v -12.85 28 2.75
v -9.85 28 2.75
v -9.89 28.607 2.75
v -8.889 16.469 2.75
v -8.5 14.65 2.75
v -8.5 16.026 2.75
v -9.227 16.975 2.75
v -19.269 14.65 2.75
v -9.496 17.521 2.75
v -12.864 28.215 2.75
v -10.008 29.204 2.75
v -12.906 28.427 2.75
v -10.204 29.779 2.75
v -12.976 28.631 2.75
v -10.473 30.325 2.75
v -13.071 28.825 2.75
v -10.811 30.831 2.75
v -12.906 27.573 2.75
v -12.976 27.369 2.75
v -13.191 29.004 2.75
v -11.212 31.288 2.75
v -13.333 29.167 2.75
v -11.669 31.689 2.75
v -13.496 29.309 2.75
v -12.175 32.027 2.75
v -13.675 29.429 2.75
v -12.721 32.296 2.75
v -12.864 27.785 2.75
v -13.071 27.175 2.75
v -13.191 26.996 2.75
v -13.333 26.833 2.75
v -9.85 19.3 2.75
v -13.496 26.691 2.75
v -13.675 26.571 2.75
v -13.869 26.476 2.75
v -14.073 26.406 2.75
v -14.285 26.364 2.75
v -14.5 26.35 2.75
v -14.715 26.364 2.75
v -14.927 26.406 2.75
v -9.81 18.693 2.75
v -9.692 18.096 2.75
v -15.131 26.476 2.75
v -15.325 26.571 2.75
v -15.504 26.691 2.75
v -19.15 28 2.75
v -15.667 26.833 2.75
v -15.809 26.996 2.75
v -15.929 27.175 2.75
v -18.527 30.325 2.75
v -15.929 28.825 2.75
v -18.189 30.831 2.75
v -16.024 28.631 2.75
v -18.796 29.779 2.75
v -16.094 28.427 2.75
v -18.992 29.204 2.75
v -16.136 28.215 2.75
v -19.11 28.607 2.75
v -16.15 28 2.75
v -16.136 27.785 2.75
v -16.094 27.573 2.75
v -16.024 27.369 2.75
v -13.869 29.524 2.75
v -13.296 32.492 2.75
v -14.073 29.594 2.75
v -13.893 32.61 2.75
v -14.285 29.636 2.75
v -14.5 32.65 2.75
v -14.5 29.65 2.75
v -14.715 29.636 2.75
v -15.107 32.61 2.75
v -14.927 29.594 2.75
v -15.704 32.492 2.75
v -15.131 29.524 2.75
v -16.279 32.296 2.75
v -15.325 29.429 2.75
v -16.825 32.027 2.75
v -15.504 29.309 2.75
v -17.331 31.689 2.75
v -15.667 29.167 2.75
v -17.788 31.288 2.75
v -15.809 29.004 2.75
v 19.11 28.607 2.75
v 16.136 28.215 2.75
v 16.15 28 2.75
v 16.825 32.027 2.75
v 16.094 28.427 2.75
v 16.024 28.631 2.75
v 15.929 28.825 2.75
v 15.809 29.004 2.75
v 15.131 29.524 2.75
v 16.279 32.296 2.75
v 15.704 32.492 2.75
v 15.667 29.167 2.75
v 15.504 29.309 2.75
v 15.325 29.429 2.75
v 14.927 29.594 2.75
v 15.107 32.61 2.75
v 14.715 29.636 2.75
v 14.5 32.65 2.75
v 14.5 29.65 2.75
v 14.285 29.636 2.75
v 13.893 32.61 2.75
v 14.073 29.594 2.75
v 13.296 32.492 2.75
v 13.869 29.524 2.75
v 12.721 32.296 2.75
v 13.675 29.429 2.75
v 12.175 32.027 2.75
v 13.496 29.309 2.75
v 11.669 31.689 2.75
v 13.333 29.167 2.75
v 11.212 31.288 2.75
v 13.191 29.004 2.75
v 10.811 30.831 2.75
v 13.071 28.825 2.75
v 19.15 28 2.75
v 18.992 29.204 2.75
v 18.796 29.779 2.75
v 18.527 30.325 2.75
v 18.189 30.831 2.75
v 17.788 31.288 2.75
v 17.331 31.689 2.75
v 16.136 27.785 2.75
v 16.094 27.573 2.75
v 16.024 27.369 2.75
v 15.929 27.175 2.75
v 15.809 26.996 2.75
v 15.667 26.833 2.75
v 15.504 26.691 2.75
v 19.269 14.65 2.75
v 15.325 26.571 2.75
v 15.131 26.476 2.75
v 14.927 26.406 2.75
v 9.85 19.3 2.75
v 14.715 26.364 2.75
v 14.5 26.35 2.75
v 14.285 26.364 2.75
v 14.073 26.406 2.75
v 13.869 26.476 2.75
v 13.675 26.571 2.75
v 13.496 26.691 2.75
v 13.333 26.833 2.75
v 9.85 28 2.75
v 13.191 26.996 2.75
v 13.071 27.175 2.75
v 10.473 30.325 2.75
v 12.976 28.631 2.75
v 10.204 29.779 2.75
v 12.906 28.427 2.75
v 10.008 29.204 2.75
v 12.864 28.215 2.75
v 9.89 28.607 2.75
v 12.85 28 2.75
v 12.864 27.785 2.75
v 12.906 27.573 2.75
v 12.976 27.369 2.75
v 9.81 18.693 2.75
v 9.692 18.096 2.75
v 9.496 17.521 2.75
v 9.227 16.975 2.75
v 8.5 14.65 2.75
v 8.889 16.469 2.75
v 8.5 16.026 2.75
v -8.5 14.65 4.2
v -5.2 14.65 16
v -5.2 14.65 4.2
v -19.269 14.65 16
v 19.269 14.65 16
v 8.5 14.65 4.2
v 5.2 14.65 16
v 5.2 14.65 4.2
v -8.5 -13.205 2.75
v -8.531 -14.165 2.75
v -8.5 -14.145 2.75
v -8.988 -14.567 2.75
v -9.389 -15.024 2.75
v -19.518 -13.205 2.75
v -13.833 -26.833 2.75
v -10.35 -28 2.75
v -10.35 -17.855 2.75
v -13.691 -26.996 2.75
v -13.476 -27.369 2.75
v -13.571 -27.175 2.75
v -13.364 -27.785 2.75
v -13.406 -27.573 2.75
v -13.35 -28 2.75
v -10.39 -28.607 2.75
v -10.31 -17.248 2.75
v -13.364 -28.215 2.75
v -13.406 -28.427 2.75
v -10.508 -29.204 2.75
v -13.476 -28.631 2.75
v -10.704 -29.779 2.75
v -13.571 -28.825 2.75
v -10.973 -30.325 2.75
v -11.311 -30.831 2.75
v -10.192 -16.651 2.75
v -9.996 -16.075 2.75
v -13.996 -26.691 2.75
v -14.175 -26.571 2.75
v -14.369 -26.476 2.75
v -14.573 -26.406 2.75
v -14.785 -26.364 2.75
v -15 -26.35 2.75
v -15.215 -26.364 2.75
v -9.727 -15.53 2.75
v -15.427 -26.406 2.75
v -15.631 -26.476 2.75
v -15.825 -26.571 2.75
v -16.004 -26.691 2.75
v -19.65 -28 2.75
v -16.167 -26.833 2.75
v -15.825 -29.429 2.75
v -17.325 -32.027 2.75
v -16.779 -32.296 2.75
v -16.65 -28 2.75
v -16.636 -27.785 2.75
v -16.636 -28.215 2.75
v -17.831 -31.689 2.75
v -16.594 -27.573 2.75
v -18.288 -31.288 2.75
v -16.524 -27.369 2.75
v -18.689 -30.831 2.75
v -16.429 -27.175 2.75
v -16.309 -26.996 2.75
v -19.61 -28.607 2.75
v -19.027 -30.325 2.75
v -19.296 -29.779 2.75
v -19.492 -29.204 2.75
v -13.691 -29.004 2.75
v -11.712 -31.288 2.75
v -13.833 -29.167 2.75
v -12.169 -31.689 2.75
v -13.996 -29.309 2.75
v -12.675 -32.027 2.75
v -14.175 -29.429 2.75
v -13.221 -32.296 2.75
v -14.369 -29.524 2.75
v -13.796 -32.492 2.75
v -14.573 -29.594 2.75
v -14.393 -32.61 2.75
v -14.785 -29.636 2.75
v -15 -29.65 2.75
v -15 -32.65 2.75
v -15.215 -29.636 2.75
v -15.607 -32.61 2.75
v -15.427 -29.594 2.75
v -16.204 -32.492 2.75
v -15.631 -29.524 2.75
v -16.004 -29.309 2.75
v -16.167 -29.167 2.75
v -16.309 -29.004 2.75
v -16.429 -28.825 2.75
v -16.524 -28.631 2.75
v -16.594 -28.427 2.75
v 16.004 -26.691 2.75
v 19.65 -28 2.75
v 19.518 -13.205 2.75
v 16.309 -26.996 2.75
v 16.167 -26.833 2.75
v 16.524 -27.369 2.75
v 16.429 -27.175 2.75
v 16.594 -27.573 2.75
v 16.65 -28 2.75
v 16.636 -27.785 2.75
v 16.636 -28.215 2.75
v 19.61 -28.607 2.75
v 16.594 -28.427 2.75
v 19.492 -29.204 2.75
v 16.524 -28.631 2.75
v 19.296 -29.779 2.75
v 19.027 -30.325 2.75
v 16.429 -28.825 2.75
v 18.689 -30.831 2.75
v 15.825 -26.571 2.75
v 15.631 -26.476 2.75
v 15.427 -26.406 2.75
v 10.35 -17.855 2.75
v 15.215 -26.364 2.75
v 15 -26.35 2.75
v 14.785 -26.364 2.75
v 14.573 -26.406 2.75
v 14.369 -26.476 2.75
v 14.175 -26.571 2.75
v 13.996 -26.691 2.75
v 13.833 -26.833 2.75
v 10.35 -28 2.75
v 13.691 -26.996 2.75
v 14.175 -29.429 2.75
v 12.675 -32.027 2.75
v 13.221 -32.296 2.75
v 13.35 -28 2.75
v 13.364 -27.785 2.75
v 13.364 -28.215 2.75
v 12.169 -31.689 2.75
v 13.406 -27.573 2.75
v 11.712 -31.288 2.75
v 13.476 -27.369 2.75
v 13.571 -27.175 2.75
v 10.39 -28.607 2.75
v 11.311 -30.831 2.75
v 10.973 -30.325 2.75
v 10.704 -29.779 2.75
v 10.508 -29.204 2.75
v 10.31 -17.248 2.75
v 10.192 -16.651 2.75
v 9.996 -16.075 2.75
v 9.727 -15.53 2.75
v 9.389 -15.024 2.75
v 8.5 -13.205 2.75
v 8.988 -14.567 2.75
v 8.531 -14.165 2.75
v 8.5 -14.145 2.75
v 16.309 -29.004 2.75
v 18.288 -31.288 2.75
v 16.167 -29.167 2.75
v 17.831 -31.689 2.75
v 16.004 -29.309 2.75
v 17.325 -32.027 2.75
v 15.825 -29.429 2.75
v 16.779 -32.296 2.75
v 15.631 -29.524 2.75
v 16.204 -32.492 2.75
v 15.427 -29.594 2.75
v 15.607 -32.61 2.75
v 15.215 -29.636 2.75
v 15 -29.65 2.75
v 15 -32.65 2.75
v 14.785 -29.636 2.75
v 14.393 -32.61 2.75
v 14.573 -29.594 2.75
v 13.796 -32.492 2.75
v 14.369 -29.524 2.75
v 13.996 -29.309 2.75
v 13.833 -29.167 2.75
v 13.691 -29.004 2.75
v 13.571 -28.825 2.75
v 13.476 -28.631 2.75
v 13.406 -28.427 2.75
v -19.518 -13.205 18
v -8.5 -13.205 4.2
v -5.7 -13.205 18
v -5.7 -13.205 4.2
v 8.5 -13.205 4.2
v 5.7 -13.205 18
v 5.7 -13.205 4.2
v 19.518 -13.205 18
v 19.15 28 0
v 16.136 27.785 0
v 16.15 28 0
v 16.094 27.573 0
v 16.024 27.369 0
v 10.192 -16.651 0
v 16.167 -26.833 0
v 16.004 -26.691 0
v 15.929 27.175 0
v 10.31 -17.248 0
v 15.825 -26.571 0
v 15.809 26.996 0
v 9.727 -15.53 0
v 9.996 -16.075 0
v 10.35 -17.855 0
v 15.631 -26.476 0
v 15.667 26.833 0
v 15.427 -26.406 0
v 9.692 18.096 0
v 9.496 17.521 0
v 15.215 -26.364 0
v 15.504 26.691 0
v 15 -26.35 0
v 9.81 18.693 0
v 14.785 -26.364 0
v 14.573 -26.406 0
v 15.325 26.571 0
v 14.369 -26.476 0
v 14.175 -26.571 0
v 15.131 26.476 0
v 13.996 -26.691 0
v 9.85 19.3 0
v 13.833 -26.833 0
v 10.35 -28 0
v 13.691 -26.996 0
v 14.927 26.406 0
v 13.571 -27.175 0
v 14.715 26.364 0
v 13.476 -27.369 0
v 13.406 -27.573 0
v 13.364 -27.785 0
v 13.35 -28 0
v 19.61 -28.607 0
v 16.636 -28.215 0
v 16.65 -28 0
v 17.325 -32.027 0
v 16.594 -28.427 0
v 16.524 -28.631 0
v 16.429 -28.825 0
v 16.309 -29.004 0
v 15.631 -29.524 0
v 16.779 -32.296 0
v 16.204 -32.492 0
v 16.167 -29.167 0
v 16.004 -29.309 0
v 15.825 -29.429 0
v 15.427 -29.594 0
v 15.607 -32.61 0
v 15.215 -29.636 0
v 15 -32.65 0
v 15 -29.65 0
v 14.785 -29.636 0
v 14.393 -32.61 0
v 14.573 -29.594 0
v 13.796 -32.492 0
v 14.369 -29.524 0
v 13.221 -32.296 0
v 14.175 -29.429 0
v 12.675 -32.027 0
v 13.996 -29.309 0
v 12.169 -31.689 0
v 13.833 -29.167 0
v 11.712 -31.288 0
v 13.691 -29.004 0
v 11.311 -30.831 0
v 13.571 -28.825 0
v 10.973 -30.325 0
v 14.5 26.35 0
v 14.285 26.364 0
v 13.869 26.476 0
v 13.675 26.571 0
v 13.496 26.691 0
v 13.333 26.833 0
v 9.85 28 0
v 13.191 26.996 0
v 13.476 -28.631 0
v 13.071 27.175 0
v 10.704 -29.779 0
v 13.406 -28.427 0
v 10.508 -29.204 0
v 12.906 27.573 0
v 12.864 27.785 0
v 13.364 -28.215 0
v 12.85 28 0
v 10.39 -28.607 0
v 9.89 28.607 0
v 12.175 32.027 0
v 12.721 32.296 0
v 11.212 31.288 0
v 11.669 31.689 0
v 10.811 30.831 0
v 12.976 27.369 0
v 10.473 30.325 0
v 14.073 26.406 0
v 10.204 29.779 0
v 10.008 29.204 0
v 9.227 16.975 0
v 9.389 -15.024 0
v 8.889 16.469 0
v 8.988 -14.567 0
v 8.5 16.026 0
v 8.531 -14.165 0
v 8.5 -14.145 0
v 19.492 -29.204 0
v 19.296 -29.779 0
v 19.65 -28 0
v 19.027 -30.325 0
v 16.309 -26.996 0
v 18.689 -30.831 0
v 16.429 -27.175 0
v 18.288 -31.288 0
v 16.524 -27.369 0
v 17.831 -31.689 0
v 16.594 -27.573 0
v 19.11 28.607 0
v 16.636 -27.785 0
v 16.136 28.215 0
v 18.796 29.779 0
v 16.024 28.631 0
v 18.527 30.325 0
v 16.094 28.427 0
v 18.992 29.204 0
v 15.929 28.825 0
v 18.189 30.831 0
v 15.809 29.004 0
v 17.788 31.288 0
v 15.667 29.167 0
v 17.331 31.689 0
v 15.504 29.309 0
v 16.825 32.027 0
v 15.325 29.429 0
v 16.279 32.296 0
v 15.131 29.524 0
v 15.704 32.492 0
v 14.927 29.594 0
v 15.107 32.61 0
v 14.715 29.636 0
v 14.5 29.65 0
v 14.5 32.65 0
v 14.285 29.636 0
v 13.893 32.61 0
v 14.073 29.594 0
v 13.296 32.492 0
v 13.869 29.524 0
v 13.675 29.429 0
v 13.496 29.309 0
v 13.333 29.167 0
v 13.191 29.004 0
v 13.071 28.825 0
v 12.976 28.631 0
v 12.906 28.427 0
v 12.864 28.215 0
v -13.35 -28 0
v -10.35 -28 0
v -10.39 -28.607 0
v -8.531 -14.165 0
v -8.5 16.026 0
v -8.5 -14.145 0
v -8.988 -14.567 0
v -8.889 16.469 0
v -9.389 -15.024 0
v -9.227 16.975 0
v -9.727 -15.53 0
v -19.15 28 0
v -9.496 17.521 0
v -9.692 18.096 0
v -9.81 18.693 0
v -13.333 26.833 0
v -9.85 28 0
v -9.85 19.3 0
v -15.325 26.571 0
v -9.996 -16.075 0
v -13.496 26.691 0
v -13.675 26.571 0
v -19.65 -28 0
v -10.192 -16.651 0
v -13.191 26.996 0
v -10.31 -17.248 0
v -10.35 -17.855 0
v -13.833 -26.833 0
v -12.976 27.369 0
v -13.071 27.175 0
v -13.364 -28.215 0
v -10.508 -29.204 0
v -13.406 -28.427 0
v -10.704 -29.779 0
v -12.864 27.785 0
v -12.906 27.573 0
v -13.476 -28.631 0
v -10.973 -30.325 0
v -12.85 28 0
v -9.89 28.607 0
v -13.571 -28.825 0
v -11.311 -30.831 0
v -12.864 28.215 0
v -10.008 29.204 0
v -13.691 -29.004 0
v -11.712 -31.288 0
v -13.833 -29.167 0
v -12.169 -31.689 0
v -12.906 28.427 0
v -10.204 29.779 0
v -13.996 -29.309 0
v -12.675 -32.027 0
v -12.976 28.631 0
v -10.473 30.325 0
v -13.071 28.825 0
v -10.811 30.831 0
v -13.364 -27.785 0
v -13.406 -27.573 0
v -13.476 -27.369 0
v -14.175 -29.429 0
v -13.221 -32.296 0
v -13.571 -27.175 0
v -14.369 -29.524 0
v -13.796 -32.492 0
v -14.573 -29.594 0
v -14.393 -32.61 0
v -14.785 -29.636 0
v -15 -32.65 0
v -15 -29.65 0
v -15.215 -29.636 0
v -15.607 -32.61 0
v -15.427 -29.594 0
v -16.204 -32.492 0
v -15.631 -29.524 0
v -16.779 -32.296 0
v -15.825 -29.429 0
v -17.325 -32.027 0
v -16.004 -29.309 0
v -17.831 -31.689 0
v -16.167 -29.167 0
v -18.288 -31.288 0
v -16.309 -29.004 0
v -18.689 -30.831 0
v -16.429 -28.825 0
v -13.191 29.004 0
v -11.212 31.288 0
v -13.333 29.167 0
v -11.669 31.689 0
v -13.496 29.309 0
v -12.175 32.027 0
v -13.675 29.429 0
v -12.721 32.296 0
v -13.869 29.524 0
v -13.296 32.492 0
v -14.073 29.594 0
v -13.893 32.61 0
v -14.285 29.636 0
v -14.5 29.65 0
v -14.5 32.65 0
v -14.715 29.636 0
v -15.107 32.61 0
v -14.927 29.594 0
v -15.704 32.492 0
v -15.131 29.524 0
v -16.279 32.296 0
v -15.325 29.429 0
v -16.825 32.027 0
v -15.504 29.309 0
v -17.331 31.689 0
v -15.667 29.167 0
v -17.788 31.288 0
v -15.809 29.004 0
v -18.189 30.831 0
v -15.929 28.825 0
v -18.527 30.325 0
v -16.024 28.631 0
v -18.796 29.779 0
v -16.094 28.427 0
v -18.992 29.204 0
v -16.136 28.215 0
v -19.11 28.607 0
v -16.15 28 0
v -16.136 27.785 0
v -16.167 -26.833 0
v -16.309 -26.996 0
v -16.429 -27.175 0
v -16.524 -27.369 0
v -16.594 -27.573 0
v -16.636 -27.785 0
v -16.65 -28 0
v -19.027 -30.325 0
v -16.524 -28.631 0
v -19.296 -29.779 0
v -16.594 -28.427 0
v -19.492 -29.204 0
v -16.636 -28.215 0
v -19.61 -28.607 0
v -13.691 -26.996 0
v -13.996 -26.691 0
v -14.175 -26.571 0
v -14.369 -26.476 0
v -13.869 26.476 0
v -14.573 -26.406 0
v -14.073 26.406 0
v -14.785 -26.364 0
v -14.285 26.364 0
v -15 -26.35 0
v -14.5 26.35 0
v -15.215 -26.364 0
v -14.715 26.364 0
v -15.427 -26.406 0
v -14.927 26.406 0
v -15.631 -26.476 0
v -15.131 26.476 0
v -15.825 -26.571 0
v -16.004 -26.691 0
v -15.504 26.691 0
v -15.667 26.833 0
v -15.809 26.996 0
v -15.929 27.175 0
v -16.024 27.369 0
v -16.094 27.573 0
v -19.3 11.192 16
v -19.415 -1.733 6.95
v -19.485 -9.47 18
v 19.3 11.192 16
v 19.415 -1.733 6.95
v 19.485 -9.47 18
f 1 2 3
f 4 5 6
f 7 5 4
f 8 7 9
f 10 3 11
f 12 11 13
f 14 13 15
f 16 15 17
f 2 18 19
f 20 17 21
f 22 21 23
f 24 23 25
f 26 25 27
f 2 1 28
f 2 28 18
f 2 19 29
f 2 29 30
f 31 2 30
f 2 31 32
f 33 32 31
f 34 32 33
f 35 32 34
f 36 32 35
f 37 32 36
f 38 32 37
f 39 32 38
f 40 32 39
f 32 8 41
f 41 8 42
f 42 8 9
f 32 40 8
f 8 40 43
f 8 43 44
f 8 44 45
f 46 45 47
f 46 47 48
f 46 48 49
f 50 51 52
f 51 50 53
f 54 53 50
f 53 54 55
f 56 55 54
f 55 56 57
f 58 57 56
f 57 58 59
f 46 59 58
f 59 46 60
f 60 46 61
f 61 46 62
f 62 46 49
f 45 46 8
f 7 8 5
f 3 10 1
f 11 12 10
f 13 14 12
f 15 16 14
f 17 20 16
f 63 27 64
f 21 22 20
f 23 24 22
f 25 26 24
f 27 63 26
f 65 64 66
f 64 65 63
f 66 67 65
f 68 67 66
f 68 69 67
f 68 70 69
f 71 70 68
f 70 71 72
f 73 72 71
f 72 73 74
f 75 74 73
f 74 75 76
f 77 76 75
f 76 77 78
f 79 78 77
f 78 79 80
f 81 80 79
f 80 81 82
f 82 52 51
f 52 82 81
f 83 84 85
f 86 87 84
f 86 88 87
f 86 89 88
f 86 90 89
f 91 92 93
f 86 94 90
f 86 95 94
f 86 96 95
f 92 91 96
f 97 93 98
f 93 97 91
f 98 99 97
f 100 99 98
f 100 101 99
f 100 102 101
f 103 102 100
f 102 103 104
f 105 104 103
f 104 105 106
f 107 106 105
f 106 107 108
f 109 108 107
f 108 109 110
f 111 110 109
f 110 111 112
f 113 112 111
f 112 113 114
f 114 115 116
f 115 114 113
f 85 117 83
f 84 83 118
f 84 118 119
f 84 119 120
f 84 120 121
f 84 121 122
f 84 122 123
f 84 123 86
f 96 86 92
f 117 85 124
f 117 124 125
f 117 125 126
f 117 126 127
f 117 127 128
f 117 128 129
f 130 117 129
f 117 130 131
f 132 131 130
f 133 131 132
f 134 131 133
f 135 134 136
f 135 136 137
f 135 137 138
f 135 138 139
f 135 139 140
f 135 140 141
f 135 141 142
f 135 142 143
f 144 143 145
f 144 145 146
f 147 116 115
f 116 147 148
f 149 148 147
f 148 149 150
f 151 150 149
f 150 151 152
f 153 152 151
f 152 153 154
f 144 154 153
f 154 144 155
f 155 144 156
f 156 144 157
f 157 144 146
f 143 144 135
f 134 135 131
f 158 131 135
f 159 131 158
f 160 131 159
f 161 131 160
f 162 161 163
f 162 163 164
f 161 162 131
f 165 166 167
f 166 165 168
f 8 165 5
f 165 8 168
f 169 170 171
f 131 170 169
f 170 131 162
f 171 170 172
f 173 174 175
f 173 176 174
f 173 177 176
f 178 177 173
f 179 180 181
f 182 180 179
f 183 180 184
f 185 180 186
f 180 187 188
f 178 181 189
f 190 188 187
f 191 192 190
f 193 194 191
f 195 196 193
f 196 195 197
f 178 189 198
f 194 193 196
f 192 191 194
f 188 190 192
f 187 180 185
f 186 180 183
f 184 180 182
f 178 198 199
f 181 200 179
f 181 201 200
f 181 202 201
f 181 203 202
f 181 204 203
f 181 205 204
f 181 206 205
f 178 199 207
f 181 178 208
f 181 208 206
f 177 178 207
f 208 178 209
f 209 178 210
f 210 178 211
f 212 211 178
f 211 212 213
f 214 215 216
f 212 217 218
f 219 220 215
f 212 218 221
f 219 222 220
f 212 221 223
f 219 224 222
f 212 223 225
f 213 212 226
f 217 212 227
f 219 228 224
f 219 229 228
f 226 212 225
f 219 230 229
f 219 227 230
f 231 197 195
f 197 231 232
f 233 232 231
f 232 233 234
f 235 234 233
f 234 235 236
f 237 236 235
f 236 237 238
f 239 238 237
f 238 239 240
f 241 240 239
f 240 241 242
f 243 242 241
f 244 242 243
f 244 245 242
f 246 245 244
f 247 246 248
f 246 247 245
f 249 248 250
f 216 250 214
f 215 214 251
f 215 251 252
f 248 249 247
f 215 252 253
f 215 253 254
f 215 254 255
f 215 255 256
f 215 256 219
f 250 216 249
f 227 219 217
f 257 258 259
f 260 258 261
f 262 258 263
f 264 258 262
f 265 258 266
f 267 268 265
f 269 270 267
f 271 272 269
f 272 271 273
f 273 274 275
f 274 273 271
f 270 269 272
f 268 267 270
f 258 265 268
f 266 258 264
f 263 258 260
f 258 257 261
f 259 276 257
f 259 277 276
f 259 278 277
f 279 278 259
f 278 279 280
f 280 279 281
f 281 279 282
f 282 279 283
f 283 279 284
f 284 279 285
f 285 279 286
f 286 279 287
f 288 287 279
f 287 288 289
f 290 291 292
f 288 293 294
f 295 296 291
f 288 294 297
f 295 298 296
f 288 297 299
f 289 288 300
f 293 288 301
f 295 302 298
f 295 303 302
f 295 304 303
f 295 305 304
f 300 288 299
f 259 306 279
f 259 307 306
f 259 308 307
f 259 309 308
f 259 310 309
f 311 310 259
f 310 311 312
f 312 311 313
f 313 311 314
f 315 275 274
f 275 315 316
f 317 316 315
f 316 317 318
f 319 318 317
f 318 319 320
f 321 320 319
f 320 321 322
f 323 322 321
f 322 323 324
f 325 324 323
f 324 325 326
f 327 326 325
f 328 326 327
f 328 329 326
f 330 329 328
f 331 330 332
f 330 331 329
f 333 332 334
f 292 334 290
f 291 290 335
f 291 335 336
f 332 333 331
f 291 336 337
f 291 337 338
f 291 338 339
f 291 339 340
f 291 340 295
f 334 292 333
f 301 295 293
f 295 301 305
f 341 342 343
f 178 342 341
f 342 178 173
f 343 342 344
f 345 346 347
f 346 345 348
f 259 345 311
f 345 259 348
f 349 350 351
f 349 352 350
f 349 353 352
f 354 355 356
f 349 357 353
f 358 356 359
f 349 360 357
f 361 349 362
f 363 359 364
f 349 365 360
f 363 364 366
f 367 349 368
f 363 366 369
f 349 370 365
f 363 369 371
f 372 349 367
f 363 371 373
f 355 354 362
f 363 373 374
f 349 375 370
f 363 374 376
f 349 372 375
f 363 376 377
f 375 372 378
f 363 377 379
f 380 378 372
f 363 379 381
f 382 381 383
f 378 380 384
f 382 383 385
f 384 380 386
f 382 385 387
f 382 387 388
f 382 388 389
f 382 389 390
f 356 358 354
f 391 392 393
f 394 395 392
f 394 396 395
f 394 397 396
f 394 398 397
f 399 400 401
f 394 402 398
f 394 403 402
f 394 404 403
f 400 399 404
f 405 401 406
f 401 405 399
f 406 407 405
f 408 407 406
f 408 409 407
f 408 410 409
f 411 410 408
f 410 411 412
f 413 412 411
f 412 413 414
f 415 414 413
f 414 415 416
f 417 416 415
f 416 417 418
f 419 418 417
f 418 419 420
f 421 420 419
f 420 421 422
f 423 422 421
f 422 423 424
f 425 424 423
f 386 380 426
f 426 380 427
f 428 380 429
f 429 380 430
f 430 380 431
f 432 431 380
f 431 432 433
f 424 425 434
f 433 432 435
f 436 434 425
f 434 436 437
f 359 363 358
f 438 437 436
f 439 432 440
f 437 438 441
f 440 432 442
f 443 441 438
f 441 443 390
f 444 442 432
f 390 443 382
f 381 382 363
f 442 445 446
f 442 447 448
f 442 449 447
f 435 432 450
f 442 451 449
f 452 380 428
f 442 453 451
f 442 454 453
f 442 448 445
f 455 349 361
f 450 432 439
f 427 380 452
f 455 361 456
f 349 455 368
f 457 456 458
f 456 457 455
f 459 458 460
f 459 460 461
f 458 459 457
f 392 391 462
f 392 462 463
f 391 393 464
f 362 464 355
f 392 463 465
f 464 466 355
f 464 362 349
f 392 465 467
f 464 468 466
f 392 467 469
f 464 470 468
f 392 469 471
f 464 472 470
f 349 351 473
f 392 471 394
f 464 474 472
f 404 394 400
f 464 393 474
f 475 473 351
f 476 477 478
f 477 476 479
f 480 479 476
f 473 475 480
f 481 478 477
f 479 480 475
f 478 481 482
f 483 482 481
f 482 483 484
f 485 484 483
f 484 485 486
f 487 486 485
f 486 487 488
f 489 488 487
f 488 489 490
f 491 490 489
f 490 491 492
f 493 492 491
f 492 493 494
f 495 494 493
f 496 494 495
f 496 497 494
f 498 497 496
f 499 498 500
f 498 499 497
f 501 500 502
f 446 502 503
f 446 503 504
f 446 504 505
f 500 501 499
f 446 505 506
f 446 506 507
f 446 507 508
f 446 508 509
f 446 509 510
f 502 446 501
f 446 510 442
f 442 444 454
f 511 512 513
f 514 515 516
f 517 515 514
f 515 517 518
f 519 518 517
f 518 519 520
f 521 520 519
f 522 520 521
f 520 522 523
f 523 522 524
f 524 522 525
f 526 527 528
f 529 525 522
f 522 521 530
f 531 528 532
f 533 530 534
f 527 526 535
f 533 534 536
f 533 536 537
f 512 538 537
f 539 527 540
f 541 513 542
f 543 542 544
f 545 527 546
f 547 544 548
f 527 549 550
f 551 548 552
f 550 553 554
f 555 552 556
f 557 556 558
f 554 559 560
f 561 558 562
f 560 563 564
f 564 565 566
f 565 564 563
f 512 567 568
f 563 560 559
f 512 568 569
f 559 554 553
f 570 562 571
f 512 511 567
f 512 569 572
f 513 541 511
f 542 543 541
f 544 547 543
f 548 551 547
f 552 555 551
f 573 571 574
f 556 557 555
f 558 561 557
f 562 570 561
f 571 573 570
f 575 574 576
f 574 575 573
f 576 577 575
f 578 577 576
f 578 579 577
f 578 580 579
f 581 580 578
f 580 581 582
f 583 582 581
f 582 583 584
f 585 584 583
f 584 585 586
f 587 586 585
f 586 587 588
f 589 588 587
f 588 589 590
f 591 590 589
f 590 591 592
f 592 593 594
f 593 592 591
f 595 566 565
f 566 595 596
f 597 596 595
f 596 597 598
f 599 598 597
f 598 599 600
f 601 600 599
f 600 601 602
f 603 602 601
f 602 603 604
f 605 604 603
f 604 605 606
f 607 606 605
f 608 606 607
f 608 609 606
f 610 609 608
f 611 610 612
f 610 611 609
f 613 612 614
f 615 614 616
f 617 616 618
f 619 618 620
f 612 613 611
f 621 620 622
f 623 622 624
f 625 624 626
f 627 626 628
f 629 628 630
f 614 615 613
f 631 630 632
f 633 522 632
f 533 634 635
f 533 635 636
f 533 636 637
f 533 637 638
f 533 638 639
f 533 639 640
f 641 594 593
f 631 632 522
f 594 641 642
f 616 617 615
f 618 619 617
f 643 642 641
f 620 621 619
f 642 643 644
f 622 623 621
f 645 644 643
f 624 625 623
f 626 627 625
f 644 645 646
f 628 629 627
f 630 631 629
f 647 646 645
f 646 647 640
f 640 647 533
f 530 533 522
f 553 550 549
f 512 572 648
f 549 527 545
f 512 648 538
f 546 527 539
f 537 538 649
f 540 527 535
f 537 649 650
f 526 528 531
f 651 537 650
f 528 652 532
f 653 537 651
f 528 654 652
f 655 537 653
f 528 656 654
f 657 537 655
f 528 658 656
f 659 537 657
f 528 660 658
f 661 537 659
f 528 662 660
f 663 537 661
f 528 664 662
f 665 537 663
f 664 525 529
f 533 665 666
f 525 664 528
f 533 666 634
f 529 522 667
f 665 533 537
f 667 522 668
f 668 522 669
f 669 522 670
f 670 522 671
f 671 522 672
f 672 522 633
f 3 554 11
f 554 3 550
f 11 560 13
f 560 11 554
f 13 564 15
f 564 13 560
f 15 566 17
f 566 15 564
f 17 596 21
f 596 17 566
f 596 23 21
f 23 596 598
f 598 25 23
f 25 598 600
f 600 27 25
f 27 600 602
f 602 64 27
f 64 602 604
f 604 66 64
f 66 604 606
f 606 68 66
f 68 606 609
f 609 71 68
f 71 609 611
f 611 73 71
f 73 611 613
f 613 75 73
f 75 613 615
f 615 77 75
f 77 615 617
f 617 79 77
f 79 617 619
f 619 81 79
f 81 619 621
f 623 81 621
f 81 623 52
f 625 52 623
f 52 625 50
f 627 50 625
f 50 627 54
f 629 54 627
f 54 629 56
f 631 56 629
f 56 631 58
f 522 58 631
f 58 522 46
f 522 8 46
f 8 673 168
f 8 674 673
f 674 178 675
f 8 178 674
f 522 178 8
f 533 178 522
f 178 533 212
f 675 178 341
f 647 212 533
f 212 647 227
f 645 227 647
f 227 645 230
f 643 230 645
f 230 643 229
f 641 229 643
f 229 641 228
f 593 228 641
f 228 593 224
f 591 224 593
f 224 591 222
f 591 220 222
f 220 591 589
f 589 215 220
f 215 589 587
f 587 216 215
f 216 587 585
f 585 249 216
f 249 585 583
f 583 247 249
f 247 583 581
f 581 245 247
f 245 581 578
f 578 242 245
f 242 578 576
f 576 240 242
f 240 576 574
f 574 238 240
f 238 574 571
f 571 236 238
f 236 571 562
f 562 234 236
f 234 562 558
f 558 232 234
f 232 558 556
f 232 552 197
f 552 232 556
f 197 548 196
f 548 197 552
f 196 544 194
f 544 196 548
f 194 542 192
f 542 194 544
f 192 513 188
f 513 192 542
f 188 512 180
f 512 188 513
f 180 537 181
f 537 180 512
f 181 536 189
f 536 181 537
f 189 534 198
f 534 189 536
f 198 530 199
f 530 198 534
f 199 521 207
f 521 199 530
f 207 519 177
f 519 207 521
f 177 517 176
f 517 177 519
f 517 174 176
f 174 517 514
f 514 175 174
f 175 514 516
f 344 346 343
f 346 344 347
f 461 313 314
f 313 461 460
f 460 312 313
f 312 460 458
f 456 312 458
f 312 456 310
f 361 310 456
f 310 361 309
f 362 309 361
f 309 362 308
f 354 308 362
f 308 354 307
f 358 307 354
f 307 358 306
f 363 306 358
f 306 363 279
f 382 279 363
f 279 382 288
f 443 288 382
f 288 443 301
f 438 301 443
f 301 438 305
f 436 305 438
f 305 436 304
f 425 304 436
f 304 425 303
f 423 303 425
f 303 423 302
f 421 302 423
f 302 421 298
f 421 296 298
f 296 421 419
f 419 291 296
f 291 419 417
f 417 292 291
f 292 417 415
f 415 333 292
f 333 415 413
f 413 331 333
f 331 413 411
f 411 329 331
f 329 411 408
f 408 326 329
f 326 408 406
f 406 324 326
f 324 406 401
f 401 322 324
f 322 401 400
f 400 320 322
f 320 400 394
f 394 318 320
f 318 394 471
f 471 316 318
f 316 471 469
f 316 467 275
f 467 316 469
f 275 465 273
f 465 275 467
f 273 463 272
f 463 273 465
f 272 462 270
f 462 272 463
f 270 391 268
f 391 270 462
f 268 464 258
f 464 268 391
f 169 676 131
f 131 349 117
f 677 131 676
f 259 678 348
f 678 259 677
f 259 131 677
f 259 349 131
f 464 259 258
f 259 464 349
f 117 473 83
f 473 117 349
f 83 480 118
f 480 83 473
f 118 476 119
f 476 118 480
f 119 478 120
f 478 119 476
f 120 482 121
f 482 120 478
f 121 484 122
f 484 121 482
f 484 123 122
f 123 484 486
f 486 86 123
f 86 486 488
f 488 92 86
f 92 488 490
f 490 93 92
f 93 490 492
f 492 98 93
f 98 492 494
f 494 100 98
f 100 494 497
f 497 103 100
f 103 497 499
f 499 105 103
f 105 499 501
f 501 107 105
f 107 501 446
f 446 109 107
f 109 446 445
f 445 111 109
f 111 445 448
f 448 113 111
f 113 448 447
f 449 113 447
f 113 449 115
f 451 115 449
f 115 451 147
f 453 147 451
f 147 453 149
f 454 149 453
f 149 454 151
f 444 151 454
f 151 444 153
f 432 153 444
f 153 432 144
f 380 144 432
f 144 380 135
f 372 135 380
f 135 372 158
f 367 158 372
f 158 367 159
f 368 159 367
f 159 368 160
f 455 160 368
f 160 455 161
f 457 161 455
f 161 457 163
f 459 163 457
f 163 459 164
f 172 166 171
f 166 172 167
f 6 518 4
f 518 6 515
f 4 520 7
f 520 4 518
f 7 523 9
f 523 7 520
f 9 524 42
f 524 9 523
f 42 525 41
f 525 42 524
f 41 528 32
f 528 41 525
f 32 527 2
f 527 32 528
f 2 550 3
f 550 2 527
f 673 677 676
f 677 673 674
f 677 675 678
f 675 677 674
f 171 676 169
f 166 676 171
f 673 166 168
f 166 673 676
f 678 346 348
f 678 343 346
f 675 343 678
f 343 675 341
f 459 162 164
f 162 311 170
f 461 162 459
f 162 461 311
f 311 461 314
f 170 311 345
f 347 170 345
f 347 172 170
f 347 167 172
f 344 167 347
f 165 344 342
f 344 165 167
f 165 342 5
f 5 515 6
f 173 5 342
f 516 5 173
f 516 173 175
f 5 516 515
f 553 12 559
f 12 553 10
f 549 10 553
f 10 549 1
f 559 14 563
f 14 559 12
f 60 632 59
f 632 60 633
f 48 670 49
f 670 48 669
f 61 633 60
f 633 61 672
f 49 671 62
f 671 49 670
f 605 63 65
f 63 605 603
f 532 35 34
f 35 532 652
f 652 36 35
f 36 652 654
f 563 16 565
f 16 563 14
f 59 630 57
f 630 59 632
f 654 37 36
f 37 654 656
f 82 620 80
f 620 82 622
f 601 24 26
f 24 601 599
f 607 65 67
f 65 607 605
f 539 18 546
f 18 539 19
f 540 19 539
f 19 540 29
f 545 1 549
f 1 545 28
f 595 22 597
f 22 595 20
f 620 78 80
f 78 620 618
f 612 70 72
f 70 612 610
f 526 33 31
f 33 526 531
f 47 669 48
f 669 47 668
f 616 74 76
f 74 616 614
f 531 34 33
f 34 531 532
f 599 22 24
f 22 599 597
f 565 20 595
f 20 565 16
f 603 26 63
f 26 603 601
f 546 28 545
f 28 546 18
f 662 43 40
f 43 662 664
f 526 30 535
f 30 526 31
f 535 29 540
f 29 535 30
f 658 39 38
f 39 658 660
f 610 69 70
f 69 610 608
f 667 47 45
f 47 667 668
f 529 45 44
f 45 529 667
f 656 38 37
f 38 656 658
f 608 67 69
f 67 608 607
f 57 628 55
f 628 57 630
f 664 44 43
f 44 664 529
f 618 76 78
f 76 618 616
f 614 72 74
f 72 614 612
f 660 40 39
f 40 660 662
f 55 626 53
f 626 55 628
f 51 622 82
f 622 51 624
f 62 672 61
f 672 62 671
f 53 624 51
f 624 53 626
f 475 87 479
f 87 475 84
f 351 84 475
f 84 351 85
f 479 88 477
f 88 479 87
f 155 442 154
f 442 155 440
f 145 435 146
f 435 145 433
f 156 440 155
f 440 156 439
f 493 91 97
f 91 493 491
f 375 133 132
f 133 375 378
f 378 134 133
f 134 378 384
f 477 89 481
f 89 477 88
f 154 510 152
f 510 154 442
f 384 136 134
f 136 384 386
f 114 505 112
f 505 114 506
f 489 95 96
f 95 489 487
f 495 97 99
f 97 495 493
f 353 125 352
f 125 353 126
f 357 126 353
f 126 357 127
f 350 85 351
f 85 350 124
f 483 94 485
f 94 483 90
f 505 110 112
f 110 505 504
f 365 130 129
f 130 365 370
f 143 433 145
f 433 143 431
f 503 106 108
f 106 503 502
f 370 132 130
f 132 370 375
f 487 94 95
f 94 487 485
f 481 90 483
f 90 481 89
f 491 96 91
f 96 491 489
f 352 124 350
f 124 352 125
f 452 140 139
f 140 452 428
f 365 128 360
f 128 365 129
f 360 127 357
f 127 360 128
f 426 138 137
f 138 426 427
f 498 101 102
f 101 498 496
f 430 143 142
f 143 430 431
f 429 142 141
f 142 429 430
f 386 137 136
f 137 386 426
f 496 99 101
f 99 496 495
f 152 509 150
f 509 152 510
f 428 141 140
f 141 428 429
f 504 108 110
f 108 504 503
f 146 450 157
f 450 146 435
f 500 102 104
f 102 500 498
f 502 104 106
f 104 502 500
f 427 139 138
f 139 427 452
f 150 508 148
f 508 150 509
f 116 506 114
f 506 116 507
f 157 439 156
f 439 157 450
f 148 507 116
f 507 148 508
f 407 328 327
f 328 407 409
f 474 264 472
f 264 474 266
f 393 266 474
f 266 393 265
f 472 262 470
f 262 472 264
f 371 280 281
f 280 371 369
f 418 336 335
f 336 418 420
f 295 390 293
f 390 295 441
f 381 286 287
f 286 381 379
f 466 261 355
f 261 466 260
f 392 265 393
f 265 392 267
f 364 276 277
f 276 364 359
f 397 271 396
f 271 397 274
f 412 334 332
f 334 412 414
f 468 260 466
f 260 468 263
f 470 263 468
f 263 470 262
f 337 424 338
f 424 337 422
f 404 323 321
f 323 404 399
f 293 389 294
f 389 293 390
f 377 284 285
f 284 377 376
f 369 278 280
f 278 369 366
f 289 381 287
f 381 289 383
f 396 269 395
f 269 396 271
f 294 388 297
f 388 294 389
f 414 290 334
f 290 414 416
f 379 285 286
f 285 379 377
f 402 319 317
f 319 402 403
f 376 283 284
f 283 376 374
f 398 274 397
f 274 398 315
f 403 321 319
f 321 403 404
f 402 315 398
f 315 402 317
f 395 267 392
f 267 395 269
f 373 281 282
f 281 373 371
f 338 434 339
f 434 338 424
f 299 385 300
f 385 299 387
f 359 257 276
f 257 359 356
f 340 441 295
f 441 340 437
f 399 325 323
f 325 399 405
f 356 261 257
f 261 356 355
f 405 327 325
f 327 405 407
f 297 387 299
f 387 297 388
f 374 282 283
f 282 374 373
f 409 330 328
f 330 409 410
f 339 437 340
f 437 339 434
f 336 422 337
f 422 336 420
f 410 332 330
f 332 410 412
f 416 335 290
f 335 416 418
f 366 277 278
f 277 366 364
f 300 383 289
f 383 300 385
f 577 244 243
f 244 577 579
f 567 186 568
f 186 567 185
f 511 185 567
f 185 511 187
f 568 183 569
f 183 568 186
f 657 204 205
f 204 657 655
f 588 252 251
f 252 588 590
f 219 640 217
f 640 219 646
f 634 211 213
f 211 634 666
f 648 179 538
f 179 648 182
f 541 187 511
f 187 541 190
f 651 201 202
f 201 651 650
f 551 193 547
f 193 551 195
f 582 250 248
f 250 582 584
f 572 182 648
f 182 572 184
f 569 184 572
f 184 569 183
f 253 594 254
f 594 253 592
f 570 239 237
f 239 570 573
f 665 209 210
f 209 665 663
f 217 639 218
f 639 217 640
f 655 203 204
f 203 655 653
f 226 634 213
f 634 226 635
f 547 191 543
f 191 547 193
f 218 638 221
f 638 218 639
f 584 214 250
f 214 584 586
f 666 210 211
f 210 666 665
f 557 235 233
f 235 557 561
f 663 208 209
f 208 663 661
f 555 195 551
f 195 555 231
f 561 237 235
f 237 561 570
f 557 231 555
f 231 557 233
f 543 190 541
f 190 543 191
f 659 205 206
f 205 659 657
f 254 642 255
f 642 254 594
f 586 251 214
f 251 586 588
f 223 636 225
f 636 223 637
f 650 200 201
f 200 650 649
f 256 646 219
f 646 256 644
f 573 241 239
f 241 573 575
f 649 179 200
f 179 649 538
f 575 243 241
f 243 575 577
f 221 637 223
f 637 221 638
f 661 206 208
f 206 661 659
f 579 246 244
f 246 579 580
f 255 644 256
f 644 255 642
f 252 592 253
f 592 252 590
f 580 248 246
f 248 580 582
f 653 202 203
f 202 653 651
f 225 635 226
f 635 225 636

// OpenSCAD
//Depth of camera
camera_depth = 20;
//Height of the supporting back
back_height = 20;
//C/C Distance between front holes
front_cc = 29;
//C/C Distance between rear holes
rear_cc = 30;
//C/C Distance between front and rear holes
front_rear_cc = 56;
//angle of camera
angle = 35; //[10:45]
//Thickness of the base
base_thickness = 2.75;
//Hole diameter (may need adjustment depending on printer)
hole_size = 3.3;
//Determines the amount of "meat" around the holes
edge_margin = 3;
//Diameter of screw head (to allow enough clerance)
screw_head_size = 6.1;
//Wedge offset from front
front_offset = 18;
//Add lip to fron of wedge
use_lip = "No"; //[Yes,No]
//Velcro strap width
velcro_width = 17;
//Velcro strap thickness
velcro_thickness = 4.2;
//antenna holder angle
angle2 = 85;
antDist = 7;


//Calculated variables wont be visible to Thingiverse customizer
hole_clearence = edge_margin+hole_size/2;
screw_head_clerance = screw_head_size / 2;
hole_radius = hole_size / 2;
lip_thickness = use_lip == "Yes" ? 5*1 : 0*1;
lip_height =  use_lip == "Yes" ? 5*1 : 0*1;

//internal global varaibles
_xFrontOffset = front_cc/2;
_xRearOffset = rear_cc/2;
_xTotFrontOffset = front_cc/2+hole_clearence;
_xTotRearOffset = rear_cc/2+hole_clearence;
_yOffset = front_rear_cc/2;
_yTotOffset = front_rear_cc/2+hole_clearence;
_cameraHolderDepth = (lip_thickness+camera_depth)*cos(angle)+back_height*sin(angle)+lip_thickness;
_cameraHolderHeight = back_height*cos(angle) + base_thickness + velcro_thickness;
_wedgeStartYoffset = _yTotOffset - front_offset;
_wedgeEndYoffset = _yTotOffset - front_offset - _cameraHolderDepth;
_rearSpaceLeft = _yTotOffset * 2 - front_offset - _cameraHolderDepth;
_totWidth = front_cc > rear_cc ? front_cc + hole_clearence*2 : rear_cc + hole_clearence*2;
_velcroXpos = (velcro_width + edge_margin) < (front_cc+2*edge_margin+hole_size) / 2 ? 0 :  ((front_cc+2*edge_margin+hole_size) / 2 )-(velcro_width + edge_margin);


/**
 *
 */
module tube(inDia, outDia, height) {
	difference(){
		cylinder(h = height, r = outDia/2, $fn=50);
		translate([0, 0, -0.5]) { cylinder(h = height+1, r = inDia/2, $fn=30); }
	}
}

module createBase()
{   
           
    difference()
    {
        linear_extrude( height = _cameraHolderHeight)
        {
            union()
            {
                if( front_offset > 0 )
                {
                    polygon(
                                points = [  [-_xTotFrontOffset, _yOffset],
                                            [-_xFrontOffset+hole_clearence, _yOffset],
                                            [-_xFrontOffset+hole_clearence, _wedgeStartYoffset],
                                            [_xFrontOffset-hole_clearence, _wedgeStartYoffset],
                                            [_xFrontOffset-hole_clearence, _yOffset],
                                            [_xTotFrontOffset, _yOffset], 
                                            [_xTotRearOffset, -_yOffset], 
                                            [_xRearOffset-hole_clearence, -_yOffset], 
                                            [_xRearOffset-hole_clearence, _wedgeEndYoffset], 
                                            [-_xRearOffset+hole_clearence, _wedgeEndYoffset], 
                                            [-_xRearOffset+hole_clearence, -_yOffset], 
                                            [-_xTotRearOffset, -_yOffset] ], 
                                convexity = 10);
                } else {
                    polygon(
                                points = [  [-_xFrontOffset, _yOffset+hole_clearence],                                        [_xFrontOffset, _yOffset+hole_clearence], 
                                            [_xTotFrontOffset, _yOffset], 
                                            [_xTotRearOffset, -_yOffset], 
                                            [_xRearOffset-hole_clearence, -_yOffset], 
                                            [_xRearOffset-hole_clearence, _wedgeEndYoffset], 
                                            [-_xRearOffset+hole_clearence, _wedgeEndYoffset], 
                                            [-_xRearOffset+hole_clearence, -_yOffset], 
                                            [-_xTotRearOffset, -_yOffset],
                                            [-_xTotFrontOffset, _yOffset]],
                                convexity = 10);
                }
                translate([-_xFrontOffset, _yOffset, 0])
                circle(r=hole_clearence, center = false); 
                translate([_xFrontOffset, _yOffset, 0])
                circle(r=hole_clearence, center = false); 
                translate([_xRearOffset, -_yOffset, 0])
                circle(r=hole_clearence, center = false); 
                translate([-_xRearOffset, -_yOffset, 0])
                circle(r=hole_clearence, center = false); 
                if(front_offset > hole_clearence*2)
                {
                    difference()
                    {
                        union()
                        {
                            translate([_xFrontOffset-hole_clearence*2, _wedgeStartYoffset, 0])
                            square([hole_clearence,hole_clearence]);
                            translate([-_xFrontOffset+hole_clearence, _wedgeStartYoffset, 0])
                            square([hole_clearence,hole_clearence]);
                        }
                        union()
                        {
                            translate([_xFrontOffset-hole_clearence*2, _wedgeStartYoffset+hole_clearence, 0])
                            circle(r=hole_clearence, center = false); 
                            translate([-_xFrontOffset+hole_clearence*2, _wedgeStartYoffset+hole_clearence, 0])                circle(r=hole_clearence, center = false);   
                        }
                    }
                }
                if((_yTotOffset + _wedgeEndYoffset) > hole_clearence*2)
                {
                    difference()
                    {
                        union()
                        {
                            translate([_xRearOffset-hole_clearence*2, _wedgeEndYoffset-hole_clearence, 0])
                            square([hole_clearence,hole_clearence]);
                            translate([-_xRearOffset+hole_clearence, _wedgeEndYoffset-hole_clearence, 0])
                            square([hole_clearence,hole_clearence]);
                            
                        }
                        union()
                        {
                            translate([_xRearOffset-hole_clearence*2, _wedgeEndYoffset-hole_clearence, 0])
                            circle(r=hole_clearence, center = false); 
                            translate([-_xRearOffset+hole_clearence*2, _wedgeEndYoffset-hole_clearence, 0])
                            circle(r=hole_clearence, center = false); 
                        }
                    }
                }
            }
        }
        union()
        {
            translate([-_totWidth/2, _wedgeStartYoffset, base_thickness])
            cube([_totWidth,front_rear_cc,_cameraHolderHeight], center = false);
            rearSpace = _yTotOffset + _wedgeEndYoffset;
            translate([-_totWidth/2, _wedgeEndYoffset-rearSpace, base_thickness])
            cube([_totWidth,rearSpace,_cameraHolderHeight], center = false);
        }
    }    
}

module addWedge()
{
    totWidth = front_cc > rear_cc ? front_cc + edge_margin*2+hole_size: rear_cc + edge_margin*2+hole_size;
                xOffset = totWidth/2;  
    difference()
    {
        difference()
        {
            children();
            union()
            {
                          
                yOffset = (front_rear_cc/2+edge_margin+hole_size/2)-(lip_thickness+camera_depth)*cos(angle) -front_offset;
                translate([-xOffset, yOffset, base_thickness+velcro_thickness])
                rotate([angle,0,0])
                cube([totWidth, camera_depth, back_height+5], center = false);
                
                
        }
       union()
       {
           yOffset = (front_rear_cc/2+edge_margin+hole_size/2)-lip_thickness*cos(angle) -front_offset; 
                zOffset = base_thickness+velcro_thickness + camera_depth*sin(angle);
                translate([-xOffset, yOffset, zOffset])
                rotate([angle,0,0])
                translate([0, -1, lip_height])
                cube([totWidth, front_rear_cc, back_height+5], center = false);
                translate([-xOffset, yOffset, zOffset])
                rotate([angle,0,0])
                translate([0, lip_thickness, 0])
                cube([totWidth, front_rear_cc, back_height+5], center = false);
           
       } 
    }
    
        translate([0,15,10+16]) cube([50, 10, 20], center = true);
        translate([0,-14,10+18]) cube([50, 10, 20], center = true);
    }
    
    
}

module addStrapHole()
{
    difference()
    {
        children();
        union()
        {
            /****
            yOffset = (front_rear_cc/2+edge_margin+hole_size/2)-lip_thickness*cos(angle) -front_offset; 
            zOffset = base_thickness+velcro_thickness + camera_depth*sin(angle);
            translate([0, yOffset, zOffset])
            rotate([angle,0,0])
            translate([_velcroXpos, 0, -zOffset+base_thickness])
            cube([velcro_width, lip_thickness+1, zOffset*2], center = false);
            ySize = camera_depth + base_thickness + velcro_thickness;
            translate([0, yOffset, zOffset])
            rotate([angle,0,0])            
            translate([_velcroXpos, -ySize, -base_thickness-velcro_thickness])
            cube([velcro_width, ySize+1, velcro_thickness], center = false);
            translate([0, yOffset, zOffset])
            rotate([angle,0,0])            
            translate([_velcroXpos, -ySize, -base_thickness-velcro_thickness])            
            cube([velcro_width, velcro_thickness, back_height*1.5], center = false);
            ****/
            
            /***
            translate([0,6,base_thickness+velcro_thickness]){ 
                rotate([angle,0,0]){
                    cube([_totWidth, velcro_width, velcro_thickness], center = true);
                }
            }
            ***/
            
            translate([0,0,velcro_thickness/2]){ 
                    cube([velcro_width,_totWidth, velcro_thickness], center = true);
            }
            
            translate([0,_wedgeStartYoffset+4.2,0]){
                ///rotate([angle,0,0]) cube([velcro_width,5.5, 40], center = true);
            }
        }
    }
}

module clearForScrews()
{
    xOffsetFront = front_cc/2;
    xOffsetRear = rear_cc/2;
    yOffset = front_rear_cc/2;
    
    difference()
    {
        children();
        union()
        {
            //Screw holes
            translate([-xOffsetFront, yOffset, (base_thickness+1)/2])
            cylinder(h=base_thickness+1, r=hole_radius, center = true); 
            translate([xOffsetFront, yOffset, (base_thickness+1)/2])
            cylinder(h=base_thickness+1, r=hole_radius, center = true); 
            translate([xOffsetRear, -yOffset, (base_thickness+1)/2])
            cylinder(h=base_thickness+1, r=hole_radius, center = true); 
            translate([-xOffsetRear, -yOffset, (base_thickness+1)/2])
            cylinder(h=base_thickness+1, r=hole_radius, center = true); 
            translate([xOffsetRear, -yOffset, 50+base_thickness])
            cylinder(h=100, r=screw_head_clerance, center = true);        translate([-xOffsetRear, -yOffset, 50+base_thickness])
            cylinder(h=100, r=screw_head_clerance, center = true);
            translate([-xOffsetFront, yOffset, 50+base_thickness])
            cylinder(h=100, r=screw_head_clerance, center = true);
            translate([xOffsetFront, yOffset, 50+base_thickness])
            cylinder(h=100, r=screw_head_clerance, center = true);
            /***
            for(i=[-1,1]){
            translate([i*antDist/2,-front_rear_cc/2-1,0]) rotate([0,i*angle2/2,0]) cylinder(r=hole_size/2, h=90, $fn=20,center=true);
}
            ***/
        }
    }
}


$fn = 48;
clearForScrews()
{
    addStrapHole()
    {
        addWedge()
        {
            createBase();
        }
    }
}

/**
//antenna holder
difference(){

for(i=[-1,1]){
translate([i*antDist/2,-front_rear_cc/2-1,0]) rotate([0,i*angle2/2,0]) tube(hole_size, 7.5, 15);
}

translate([0,0,-10/2]) cube(size=[100,100,10], center=true);
for(i=[-1,1]){
translate([i*antDist/2, -front_rear_cc/2-1,10/2+8]) cube(size=[27,10,10], center=true);
}

}//diff
**/
